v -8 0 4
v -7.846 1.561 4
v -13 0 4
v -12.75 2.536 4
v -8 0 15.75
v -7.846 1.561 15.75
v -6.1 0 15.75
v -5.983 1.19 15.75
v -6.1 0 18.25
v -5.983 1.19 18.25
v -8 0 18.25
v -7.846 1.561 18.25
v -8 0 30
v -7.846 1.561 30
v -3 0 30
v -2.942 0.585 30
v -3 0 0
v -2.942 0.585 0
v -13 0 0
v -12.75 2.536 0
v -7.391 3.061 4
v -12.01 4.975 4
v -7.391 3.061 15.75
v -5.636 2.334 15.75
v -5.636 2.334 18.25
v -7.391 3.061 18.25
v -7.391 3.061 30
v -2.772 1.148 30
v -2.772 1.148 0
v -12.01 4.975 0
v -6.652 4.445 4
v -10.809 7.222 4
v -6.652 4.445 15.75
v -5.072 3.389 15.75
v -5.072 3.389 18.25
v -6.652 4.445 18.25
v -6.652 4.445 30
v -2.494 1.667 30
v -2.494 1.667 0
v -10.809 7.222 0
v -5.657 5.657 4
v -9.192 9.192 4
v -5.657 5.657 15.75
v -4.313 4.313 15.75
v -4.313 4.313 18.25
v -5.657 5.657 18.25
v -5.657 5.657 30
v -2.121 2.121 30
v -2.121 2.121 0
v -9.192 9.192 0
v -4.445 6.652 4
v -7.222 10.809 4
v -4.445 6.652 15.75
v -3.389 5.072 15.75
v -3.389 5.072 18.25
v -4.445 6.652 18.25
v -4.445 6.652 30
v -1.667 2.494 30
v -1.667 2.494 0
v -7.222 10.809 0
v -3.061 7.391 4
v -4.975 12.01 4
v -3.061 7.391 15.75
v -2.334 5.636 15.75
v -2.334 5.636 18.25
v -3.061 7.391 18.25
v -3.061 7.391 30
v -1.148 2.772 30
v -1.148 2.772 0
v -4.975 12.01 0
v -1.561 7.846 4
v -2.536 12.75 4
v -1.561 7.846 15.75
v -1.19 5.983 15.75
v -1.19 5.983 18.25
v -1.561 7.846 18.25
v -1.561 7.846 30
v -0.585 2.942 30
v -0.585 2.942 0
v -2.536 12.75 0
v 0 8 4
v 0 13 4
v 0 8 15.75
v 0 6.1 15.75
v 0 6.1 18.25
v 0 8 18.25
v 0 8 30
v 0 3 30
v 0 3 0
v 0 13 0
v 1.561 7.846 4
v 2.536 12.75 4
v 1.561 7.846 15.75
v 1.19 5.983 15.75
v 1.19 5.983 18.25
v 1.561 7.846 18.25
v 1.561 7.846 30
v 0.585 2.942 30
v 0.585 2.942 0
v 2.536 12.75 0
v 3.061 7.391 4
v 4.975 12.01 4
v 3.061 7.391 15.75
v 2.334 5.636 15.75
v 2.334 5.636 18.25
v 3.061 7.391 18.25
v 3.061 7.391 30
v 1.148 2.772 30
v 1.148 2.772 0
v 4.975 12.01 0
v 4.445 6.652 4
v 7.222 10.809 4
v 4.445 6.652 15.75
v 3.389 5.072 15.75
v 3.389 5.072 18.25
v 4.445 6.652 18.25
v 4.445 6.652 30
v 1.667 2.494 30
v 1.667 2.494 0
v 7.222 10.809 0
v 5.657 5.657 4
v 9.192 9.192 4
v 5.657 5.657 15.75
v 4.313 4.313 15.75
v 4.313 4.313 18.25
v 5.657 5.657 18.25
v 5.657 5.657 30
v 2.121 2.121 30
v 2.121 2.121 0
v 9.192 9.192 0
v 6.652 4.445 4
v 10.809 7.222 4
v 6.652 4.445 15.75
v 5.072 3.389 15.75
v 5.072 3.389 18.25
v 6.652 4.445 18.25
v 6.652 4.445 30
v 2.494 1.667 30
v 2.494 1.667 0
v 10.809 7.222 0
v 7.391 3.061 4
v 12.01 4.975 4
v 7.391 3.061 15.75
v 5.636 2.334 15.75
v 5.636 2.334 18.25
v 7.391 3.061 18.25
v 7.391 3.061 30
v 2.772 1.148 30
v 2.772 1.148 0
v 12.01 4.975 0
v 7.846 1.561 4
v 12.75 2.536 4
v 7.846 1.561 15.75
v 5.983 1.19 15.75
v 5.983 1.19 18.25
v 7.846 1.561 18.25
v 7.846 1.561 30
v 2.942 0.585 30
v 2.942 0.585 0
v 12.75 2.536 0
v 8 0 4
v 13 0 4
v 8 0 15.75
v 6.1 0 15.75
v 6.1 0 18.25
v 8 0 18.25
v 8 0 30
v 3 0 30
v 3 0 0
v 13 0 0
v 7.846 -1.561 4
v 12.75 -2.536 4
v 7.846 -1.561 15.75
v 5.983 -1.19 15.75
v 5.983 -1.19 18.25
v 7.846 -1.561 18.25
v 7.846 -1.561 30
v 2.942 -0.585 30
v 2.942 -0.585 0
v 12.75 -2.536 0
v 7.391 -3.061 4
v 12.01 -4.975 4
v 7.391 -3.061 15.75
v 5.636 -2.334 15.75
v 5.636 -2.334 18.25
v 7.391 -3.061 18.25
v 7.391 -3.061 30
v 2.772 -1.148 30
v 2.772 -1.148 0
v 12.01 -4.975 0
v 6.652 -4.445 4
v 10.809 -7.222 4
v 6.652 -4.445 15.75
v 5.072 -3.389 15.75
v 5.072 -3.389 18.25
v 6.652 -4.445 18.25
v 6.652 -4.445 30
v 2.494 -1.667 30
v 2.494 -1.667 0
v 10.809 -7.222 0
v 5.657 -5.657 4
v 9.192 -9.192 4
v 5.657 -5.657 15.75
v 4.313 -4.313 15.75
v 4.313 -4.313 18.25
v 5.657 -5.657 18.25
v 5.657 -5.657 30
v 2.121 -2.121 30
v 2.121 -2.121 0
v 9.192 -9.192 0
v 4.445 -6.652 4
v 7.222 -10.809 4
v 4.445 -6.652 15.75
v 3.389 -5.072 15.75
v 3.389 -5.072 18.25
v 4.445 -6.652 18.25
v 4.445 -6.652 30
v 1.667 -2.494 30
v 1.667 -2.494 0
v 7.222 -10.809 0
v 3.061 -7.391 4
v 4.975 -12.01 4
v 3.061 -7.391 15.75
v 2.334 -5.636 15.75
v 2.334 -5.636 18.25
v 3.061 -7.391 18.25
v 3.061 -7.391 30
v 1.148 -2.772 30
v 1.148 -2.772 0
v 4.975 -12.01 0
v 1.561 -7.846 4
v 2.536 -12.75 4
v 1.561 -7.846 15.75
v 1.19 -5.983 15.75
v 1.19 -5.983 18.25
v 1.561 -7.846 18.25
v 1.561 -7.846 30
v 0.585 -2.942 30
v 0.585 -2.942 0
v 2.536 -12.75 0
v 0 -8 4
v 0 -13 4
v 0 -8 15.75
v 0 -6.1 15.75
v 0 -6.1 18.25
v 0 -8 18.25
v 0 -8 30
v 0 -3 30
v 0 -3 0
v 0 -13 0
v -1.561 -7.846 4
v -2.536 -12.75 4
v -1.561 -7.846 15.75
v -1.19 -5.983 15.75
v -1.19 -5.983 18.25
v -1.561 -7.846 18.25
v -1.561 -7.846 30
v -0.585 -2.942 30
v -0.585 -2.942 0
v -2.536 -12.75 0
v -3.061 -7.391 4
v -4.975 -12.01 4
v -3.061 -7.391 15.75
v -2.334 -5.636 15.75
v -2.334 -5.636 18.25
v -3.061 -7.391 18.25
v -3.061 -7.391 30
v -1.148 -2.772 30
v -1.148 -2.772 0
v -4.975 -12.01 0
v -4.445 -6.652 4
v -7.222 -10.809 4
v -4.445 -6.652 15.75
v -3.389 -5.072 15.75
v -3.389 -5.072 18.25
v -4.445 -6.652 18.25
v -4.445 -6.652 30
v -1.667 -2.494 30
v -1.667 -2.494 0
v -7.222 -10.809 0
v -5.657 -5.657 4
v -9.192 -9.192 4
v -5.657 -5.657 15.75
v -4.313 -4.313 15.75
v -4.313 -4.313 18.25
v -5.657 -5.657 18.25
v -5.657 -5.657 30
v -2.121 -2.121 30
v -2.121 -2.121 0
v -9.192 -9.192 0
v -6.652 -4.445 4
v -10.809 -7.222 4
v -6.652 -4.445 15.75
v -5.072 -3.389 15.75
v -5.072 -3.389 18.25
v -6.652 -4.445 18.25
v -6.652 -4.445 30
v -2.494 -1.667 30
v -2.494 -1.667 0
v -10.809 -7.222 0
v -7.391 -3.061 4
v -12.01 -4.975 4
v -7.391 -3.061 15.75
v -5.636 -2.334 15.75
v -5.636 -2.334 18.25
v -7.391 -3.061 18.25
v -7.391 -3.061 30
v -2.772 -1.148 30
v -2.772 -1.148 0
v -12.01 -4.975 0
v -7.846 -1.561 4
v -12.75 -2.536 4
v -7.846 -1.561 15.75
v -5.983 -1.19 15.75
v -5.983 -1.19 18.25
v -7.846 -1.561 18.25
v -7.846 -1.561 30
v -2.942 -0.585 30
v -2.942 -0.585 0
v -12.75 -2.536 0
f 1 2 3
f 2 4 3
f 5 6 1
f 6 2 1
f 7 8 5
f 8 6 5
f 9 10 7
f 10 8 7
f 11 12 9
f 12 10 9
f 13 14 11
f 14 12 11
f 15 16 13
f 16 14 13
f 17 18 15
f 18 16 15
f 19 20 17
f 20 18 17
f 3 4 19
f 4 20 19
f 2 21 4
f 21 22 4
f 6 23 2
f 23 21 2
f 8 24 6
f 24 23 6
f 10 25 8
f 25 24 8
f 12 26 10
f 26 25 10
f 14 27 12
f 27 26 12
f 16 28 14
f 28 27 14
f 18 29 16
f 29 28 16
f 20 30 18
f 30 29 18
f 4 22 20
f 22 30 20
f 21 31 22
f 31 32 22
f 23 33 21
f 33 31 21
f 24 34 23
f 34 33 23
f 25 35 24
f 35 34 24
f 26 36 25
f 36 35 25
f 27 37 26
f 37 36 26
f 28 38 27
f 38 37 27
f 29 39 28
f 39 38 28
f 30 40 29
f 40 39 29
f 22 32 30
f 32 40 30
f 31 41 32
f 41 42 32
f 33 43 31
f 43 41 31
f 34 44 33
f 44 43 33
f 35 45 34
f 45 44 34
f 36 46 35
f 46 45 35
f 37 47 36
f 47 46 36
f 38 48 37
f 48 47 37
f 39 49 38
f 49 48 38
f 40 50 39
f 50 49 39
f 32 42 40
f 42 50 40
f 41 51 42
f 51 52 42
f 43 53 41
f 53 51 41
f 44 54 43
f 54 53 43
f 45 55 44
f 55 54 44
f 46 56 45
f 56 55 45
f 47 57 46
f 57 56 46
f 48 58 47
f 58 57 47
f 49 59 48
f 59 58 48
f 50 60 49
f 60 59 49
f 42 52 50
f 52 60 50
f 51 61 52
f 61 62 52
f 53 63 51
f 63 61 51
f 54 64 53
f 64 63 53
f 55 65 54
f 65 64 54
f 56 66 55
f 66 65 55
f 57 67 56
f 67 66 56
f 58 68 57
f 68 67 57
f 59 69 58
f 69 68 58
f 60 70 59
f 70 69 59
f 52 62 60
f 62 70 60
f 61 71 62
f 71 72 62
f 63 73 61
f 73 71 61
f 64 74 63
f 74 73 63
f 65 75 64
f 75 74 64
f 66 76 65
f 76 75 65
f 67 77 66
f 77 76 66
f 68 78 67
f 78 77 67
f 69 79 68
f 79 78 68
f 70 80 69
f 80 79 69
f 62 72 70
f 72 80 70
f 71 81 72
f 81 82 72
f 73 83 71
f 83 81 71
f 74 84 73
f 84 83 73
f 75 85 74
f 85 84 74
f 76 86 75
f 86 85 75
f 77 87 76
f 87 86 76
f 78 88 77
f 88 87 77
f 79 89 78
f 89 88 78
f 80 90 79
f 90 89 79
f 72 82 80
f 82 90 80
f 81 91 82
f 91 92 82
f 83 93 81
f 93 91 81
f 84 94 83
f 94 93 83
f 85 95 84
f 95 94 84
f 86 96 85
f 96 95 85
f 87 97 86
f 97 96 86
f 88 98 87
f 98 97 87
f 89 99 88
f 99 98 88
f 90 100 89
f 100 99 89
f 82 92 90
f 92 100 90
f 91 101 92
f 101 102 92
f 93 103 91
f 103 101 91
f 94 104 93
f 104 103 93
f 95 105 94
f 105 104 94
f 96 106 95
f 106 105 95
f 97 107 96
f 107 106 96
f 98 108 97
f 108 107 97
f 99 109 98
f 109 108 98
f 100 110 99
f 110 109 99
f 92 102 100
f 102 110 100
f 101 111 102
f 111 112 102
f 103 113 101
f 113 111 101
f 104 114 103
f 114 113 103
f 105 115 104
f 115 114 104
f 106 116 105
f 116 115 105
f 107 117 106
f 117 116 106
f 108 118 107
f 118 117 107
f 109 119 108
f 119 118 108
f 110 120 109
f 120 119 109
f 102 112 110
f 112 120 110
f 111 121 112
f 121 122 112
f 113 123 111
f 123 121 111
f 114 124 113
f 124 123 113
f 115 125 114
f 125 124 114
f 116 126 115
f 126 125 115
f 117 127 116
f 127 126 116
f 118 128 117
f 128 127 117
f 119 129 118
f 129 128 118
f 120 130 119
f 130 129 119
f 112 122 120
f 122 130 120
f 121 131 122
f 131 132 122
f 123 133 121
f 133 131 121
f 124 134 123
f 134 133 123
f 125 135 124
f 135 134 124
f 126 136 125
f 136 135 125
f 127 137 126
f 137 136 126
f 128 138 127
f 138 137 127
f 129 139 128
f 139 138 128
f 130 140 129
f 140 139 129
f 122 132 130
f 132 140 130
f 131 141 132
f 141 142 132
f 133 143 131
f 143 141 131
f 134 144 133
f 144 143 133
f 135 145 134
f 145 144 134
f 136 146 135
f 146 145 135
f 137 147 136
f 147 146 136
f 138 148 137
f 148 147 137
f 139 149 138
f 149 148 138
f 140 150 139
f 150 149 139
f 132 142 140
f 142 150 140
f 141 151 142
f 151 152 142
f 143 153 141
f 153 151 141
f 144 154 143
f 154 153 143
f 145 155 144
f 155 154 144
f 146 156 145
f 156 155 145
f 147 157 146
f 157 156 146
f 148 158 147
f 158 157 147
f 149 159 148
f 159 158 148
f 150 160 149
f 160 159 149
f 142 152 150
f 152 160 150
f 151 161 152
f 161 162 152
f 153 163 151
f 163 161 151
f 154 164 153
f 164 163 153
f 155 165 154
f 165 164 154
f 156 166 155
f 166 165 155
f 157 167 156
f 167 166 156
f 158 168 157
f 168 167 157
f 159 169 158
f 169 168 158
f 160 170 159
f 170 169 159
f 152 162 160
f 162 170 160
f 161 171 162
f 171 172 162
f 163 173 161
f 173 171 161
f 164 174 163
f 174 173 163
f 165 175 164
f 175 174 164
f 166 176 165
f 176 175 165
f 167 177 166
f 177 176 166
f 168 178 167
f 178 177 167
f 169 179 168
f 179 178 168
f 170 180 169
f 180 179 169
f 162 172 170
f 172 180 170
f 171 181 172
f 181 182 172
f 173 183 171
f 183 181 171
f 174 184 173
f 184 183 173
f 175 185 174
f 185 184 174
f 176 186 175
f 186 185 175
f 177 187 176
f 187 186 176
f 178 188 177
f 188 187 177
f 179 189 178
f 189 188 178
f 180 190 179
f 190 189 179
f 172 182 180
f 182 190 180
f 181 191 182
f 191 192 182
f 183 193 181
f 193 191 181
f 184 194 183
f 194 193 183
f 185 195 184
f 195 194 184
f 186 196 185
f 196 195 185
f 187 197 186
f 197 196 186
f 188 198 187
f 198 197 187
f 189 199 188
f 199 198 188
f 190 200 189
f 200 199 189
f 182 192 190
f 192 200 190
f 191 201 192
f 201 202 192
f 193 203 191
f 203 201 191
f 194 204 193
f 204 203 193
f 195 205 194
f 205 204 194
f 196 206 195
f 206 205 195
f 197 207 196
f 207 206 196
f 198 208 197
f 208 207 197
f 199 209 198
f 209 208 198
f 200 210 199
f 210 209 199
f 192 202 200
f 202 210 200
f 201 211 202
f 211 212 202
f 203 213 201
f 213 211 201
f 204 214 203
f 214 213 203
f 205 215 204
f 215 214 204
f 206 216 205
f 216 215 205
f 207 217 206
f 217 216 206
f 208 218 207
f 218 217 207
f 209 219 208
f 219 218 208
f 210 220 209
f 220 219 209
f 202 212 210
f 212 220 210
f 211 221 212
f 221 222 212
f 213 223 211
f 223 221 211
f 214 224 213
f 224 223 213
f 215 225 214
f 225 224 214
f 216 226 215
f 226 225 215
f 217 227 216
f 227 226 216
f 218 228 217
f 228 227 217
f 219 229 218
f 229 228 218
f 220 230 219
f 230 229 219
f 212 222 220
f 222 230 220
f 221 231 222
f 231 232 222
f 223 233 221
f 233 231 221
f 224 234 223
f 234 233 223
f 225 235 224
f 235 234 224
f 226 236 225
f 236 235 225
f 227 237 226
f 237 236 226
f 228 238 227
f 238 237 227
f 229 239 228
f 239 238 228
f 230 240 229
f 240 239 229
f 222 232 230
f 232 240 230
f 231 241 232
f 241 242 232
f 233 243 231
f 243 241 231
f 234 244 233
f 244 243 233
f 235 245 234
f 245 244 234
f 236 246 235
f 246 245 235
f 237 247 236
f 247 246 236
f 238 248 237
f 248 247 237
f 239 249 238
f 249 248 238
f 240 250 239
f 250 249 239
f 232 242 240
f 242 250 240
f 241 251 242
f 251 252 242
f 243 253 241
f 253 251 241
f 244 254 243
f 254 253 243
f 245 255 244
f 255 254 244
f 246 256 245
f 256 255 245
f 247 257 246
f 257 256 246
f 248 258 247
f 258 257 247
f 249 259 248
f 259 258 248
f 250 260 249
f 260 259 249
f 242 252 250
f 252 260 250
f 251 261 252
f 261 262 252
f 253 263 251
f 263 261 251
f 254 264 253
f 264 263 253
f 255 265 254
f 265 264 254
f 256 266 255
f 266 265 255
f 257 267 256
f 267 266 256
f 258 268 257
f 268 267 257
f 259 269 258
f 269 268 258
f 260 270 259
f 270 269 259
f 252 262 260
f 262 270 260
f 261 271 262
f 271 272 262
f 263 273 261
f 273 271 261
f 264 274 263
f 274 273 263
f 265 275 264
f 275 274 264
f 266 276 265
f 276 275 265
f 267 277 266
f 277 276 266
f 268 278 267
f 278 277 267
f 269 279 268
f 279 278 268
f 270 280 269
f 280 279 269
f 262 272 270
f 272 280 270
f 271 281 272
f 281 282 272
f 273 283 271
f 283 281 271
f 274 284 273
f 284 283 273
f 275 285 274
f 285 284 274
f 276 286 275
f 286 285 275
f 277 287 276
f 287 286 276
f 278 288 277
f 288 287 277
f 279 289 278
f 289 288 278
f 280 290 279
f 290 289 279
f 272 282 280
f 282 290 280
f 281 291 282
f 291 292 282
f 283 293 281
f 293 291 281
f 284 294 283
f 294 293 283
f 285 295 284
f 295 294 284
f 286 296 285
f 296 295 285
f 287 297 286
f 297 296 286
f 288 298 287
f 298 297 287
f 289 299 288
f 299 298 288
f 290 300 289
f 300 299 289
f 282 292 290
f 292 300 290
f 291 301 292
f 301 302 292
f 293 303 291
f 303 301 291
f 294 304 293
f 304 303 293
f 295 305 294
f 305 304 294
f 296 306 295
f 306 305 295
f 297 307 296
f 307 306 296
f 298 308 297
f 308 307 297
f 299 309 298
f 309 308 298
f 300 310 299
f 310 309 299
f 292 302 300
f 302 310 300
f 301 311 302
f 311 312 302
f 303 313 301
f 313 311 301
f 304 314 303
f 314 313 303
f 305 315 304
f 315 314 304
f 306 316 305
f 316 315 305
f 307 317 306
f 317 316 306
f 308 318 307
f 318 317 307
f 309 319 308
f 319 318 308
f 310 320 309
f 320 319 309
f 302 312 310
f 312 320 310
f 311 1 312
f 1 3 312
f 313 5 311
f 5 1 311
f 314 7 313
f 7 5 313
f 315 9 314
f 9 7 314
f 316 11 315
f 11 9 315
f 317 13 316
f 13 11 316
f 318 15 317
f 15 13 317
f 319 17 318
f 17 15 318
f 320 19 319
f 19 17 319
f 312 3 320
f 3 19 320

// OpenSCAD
$fn = 32;

// ----------------------------------------------------------------------
// Grooved revolve: flanged, bore R3
// ----------------------------------------------------------------------

// --- parameters (mm) ---
bore_r = 3;               // bore radius
outer_r = 8;              // outer radius of the body
total_h = 30;             // overall height, Z
wall = 5;                 // radial wall thickness
groove_w = 2.5;           // groove width
groove_d = 1.9;           // groove depth
grooves = 1;              // number of outer grooves
flange_r = 13;            // flange radius
flange_h = 4;             // flange height

bbox_x = 2 * flange_r;  // full diameter
bore_d = 2 * bore_r;  // bore diameter
body_d = 2 * outer_r;  // body diameter
flange_d = 2 * flange_r;  // flange diameter
revolve_angle = 360;  // full turn around the Z axis

profile = [[3, 0], [8, 0], [13, 0], [13, 4], [8, 4], [8, 15.75], [6.1, 15.75], [6.1, 18.25], [8, 18.25], [8, 30], [3, 30]];  // primary outline, 11 points, counter clockwise

// --- the one profile operation ---
rotate_extrude(angle = revolve_angle) polygon(points = profile);
